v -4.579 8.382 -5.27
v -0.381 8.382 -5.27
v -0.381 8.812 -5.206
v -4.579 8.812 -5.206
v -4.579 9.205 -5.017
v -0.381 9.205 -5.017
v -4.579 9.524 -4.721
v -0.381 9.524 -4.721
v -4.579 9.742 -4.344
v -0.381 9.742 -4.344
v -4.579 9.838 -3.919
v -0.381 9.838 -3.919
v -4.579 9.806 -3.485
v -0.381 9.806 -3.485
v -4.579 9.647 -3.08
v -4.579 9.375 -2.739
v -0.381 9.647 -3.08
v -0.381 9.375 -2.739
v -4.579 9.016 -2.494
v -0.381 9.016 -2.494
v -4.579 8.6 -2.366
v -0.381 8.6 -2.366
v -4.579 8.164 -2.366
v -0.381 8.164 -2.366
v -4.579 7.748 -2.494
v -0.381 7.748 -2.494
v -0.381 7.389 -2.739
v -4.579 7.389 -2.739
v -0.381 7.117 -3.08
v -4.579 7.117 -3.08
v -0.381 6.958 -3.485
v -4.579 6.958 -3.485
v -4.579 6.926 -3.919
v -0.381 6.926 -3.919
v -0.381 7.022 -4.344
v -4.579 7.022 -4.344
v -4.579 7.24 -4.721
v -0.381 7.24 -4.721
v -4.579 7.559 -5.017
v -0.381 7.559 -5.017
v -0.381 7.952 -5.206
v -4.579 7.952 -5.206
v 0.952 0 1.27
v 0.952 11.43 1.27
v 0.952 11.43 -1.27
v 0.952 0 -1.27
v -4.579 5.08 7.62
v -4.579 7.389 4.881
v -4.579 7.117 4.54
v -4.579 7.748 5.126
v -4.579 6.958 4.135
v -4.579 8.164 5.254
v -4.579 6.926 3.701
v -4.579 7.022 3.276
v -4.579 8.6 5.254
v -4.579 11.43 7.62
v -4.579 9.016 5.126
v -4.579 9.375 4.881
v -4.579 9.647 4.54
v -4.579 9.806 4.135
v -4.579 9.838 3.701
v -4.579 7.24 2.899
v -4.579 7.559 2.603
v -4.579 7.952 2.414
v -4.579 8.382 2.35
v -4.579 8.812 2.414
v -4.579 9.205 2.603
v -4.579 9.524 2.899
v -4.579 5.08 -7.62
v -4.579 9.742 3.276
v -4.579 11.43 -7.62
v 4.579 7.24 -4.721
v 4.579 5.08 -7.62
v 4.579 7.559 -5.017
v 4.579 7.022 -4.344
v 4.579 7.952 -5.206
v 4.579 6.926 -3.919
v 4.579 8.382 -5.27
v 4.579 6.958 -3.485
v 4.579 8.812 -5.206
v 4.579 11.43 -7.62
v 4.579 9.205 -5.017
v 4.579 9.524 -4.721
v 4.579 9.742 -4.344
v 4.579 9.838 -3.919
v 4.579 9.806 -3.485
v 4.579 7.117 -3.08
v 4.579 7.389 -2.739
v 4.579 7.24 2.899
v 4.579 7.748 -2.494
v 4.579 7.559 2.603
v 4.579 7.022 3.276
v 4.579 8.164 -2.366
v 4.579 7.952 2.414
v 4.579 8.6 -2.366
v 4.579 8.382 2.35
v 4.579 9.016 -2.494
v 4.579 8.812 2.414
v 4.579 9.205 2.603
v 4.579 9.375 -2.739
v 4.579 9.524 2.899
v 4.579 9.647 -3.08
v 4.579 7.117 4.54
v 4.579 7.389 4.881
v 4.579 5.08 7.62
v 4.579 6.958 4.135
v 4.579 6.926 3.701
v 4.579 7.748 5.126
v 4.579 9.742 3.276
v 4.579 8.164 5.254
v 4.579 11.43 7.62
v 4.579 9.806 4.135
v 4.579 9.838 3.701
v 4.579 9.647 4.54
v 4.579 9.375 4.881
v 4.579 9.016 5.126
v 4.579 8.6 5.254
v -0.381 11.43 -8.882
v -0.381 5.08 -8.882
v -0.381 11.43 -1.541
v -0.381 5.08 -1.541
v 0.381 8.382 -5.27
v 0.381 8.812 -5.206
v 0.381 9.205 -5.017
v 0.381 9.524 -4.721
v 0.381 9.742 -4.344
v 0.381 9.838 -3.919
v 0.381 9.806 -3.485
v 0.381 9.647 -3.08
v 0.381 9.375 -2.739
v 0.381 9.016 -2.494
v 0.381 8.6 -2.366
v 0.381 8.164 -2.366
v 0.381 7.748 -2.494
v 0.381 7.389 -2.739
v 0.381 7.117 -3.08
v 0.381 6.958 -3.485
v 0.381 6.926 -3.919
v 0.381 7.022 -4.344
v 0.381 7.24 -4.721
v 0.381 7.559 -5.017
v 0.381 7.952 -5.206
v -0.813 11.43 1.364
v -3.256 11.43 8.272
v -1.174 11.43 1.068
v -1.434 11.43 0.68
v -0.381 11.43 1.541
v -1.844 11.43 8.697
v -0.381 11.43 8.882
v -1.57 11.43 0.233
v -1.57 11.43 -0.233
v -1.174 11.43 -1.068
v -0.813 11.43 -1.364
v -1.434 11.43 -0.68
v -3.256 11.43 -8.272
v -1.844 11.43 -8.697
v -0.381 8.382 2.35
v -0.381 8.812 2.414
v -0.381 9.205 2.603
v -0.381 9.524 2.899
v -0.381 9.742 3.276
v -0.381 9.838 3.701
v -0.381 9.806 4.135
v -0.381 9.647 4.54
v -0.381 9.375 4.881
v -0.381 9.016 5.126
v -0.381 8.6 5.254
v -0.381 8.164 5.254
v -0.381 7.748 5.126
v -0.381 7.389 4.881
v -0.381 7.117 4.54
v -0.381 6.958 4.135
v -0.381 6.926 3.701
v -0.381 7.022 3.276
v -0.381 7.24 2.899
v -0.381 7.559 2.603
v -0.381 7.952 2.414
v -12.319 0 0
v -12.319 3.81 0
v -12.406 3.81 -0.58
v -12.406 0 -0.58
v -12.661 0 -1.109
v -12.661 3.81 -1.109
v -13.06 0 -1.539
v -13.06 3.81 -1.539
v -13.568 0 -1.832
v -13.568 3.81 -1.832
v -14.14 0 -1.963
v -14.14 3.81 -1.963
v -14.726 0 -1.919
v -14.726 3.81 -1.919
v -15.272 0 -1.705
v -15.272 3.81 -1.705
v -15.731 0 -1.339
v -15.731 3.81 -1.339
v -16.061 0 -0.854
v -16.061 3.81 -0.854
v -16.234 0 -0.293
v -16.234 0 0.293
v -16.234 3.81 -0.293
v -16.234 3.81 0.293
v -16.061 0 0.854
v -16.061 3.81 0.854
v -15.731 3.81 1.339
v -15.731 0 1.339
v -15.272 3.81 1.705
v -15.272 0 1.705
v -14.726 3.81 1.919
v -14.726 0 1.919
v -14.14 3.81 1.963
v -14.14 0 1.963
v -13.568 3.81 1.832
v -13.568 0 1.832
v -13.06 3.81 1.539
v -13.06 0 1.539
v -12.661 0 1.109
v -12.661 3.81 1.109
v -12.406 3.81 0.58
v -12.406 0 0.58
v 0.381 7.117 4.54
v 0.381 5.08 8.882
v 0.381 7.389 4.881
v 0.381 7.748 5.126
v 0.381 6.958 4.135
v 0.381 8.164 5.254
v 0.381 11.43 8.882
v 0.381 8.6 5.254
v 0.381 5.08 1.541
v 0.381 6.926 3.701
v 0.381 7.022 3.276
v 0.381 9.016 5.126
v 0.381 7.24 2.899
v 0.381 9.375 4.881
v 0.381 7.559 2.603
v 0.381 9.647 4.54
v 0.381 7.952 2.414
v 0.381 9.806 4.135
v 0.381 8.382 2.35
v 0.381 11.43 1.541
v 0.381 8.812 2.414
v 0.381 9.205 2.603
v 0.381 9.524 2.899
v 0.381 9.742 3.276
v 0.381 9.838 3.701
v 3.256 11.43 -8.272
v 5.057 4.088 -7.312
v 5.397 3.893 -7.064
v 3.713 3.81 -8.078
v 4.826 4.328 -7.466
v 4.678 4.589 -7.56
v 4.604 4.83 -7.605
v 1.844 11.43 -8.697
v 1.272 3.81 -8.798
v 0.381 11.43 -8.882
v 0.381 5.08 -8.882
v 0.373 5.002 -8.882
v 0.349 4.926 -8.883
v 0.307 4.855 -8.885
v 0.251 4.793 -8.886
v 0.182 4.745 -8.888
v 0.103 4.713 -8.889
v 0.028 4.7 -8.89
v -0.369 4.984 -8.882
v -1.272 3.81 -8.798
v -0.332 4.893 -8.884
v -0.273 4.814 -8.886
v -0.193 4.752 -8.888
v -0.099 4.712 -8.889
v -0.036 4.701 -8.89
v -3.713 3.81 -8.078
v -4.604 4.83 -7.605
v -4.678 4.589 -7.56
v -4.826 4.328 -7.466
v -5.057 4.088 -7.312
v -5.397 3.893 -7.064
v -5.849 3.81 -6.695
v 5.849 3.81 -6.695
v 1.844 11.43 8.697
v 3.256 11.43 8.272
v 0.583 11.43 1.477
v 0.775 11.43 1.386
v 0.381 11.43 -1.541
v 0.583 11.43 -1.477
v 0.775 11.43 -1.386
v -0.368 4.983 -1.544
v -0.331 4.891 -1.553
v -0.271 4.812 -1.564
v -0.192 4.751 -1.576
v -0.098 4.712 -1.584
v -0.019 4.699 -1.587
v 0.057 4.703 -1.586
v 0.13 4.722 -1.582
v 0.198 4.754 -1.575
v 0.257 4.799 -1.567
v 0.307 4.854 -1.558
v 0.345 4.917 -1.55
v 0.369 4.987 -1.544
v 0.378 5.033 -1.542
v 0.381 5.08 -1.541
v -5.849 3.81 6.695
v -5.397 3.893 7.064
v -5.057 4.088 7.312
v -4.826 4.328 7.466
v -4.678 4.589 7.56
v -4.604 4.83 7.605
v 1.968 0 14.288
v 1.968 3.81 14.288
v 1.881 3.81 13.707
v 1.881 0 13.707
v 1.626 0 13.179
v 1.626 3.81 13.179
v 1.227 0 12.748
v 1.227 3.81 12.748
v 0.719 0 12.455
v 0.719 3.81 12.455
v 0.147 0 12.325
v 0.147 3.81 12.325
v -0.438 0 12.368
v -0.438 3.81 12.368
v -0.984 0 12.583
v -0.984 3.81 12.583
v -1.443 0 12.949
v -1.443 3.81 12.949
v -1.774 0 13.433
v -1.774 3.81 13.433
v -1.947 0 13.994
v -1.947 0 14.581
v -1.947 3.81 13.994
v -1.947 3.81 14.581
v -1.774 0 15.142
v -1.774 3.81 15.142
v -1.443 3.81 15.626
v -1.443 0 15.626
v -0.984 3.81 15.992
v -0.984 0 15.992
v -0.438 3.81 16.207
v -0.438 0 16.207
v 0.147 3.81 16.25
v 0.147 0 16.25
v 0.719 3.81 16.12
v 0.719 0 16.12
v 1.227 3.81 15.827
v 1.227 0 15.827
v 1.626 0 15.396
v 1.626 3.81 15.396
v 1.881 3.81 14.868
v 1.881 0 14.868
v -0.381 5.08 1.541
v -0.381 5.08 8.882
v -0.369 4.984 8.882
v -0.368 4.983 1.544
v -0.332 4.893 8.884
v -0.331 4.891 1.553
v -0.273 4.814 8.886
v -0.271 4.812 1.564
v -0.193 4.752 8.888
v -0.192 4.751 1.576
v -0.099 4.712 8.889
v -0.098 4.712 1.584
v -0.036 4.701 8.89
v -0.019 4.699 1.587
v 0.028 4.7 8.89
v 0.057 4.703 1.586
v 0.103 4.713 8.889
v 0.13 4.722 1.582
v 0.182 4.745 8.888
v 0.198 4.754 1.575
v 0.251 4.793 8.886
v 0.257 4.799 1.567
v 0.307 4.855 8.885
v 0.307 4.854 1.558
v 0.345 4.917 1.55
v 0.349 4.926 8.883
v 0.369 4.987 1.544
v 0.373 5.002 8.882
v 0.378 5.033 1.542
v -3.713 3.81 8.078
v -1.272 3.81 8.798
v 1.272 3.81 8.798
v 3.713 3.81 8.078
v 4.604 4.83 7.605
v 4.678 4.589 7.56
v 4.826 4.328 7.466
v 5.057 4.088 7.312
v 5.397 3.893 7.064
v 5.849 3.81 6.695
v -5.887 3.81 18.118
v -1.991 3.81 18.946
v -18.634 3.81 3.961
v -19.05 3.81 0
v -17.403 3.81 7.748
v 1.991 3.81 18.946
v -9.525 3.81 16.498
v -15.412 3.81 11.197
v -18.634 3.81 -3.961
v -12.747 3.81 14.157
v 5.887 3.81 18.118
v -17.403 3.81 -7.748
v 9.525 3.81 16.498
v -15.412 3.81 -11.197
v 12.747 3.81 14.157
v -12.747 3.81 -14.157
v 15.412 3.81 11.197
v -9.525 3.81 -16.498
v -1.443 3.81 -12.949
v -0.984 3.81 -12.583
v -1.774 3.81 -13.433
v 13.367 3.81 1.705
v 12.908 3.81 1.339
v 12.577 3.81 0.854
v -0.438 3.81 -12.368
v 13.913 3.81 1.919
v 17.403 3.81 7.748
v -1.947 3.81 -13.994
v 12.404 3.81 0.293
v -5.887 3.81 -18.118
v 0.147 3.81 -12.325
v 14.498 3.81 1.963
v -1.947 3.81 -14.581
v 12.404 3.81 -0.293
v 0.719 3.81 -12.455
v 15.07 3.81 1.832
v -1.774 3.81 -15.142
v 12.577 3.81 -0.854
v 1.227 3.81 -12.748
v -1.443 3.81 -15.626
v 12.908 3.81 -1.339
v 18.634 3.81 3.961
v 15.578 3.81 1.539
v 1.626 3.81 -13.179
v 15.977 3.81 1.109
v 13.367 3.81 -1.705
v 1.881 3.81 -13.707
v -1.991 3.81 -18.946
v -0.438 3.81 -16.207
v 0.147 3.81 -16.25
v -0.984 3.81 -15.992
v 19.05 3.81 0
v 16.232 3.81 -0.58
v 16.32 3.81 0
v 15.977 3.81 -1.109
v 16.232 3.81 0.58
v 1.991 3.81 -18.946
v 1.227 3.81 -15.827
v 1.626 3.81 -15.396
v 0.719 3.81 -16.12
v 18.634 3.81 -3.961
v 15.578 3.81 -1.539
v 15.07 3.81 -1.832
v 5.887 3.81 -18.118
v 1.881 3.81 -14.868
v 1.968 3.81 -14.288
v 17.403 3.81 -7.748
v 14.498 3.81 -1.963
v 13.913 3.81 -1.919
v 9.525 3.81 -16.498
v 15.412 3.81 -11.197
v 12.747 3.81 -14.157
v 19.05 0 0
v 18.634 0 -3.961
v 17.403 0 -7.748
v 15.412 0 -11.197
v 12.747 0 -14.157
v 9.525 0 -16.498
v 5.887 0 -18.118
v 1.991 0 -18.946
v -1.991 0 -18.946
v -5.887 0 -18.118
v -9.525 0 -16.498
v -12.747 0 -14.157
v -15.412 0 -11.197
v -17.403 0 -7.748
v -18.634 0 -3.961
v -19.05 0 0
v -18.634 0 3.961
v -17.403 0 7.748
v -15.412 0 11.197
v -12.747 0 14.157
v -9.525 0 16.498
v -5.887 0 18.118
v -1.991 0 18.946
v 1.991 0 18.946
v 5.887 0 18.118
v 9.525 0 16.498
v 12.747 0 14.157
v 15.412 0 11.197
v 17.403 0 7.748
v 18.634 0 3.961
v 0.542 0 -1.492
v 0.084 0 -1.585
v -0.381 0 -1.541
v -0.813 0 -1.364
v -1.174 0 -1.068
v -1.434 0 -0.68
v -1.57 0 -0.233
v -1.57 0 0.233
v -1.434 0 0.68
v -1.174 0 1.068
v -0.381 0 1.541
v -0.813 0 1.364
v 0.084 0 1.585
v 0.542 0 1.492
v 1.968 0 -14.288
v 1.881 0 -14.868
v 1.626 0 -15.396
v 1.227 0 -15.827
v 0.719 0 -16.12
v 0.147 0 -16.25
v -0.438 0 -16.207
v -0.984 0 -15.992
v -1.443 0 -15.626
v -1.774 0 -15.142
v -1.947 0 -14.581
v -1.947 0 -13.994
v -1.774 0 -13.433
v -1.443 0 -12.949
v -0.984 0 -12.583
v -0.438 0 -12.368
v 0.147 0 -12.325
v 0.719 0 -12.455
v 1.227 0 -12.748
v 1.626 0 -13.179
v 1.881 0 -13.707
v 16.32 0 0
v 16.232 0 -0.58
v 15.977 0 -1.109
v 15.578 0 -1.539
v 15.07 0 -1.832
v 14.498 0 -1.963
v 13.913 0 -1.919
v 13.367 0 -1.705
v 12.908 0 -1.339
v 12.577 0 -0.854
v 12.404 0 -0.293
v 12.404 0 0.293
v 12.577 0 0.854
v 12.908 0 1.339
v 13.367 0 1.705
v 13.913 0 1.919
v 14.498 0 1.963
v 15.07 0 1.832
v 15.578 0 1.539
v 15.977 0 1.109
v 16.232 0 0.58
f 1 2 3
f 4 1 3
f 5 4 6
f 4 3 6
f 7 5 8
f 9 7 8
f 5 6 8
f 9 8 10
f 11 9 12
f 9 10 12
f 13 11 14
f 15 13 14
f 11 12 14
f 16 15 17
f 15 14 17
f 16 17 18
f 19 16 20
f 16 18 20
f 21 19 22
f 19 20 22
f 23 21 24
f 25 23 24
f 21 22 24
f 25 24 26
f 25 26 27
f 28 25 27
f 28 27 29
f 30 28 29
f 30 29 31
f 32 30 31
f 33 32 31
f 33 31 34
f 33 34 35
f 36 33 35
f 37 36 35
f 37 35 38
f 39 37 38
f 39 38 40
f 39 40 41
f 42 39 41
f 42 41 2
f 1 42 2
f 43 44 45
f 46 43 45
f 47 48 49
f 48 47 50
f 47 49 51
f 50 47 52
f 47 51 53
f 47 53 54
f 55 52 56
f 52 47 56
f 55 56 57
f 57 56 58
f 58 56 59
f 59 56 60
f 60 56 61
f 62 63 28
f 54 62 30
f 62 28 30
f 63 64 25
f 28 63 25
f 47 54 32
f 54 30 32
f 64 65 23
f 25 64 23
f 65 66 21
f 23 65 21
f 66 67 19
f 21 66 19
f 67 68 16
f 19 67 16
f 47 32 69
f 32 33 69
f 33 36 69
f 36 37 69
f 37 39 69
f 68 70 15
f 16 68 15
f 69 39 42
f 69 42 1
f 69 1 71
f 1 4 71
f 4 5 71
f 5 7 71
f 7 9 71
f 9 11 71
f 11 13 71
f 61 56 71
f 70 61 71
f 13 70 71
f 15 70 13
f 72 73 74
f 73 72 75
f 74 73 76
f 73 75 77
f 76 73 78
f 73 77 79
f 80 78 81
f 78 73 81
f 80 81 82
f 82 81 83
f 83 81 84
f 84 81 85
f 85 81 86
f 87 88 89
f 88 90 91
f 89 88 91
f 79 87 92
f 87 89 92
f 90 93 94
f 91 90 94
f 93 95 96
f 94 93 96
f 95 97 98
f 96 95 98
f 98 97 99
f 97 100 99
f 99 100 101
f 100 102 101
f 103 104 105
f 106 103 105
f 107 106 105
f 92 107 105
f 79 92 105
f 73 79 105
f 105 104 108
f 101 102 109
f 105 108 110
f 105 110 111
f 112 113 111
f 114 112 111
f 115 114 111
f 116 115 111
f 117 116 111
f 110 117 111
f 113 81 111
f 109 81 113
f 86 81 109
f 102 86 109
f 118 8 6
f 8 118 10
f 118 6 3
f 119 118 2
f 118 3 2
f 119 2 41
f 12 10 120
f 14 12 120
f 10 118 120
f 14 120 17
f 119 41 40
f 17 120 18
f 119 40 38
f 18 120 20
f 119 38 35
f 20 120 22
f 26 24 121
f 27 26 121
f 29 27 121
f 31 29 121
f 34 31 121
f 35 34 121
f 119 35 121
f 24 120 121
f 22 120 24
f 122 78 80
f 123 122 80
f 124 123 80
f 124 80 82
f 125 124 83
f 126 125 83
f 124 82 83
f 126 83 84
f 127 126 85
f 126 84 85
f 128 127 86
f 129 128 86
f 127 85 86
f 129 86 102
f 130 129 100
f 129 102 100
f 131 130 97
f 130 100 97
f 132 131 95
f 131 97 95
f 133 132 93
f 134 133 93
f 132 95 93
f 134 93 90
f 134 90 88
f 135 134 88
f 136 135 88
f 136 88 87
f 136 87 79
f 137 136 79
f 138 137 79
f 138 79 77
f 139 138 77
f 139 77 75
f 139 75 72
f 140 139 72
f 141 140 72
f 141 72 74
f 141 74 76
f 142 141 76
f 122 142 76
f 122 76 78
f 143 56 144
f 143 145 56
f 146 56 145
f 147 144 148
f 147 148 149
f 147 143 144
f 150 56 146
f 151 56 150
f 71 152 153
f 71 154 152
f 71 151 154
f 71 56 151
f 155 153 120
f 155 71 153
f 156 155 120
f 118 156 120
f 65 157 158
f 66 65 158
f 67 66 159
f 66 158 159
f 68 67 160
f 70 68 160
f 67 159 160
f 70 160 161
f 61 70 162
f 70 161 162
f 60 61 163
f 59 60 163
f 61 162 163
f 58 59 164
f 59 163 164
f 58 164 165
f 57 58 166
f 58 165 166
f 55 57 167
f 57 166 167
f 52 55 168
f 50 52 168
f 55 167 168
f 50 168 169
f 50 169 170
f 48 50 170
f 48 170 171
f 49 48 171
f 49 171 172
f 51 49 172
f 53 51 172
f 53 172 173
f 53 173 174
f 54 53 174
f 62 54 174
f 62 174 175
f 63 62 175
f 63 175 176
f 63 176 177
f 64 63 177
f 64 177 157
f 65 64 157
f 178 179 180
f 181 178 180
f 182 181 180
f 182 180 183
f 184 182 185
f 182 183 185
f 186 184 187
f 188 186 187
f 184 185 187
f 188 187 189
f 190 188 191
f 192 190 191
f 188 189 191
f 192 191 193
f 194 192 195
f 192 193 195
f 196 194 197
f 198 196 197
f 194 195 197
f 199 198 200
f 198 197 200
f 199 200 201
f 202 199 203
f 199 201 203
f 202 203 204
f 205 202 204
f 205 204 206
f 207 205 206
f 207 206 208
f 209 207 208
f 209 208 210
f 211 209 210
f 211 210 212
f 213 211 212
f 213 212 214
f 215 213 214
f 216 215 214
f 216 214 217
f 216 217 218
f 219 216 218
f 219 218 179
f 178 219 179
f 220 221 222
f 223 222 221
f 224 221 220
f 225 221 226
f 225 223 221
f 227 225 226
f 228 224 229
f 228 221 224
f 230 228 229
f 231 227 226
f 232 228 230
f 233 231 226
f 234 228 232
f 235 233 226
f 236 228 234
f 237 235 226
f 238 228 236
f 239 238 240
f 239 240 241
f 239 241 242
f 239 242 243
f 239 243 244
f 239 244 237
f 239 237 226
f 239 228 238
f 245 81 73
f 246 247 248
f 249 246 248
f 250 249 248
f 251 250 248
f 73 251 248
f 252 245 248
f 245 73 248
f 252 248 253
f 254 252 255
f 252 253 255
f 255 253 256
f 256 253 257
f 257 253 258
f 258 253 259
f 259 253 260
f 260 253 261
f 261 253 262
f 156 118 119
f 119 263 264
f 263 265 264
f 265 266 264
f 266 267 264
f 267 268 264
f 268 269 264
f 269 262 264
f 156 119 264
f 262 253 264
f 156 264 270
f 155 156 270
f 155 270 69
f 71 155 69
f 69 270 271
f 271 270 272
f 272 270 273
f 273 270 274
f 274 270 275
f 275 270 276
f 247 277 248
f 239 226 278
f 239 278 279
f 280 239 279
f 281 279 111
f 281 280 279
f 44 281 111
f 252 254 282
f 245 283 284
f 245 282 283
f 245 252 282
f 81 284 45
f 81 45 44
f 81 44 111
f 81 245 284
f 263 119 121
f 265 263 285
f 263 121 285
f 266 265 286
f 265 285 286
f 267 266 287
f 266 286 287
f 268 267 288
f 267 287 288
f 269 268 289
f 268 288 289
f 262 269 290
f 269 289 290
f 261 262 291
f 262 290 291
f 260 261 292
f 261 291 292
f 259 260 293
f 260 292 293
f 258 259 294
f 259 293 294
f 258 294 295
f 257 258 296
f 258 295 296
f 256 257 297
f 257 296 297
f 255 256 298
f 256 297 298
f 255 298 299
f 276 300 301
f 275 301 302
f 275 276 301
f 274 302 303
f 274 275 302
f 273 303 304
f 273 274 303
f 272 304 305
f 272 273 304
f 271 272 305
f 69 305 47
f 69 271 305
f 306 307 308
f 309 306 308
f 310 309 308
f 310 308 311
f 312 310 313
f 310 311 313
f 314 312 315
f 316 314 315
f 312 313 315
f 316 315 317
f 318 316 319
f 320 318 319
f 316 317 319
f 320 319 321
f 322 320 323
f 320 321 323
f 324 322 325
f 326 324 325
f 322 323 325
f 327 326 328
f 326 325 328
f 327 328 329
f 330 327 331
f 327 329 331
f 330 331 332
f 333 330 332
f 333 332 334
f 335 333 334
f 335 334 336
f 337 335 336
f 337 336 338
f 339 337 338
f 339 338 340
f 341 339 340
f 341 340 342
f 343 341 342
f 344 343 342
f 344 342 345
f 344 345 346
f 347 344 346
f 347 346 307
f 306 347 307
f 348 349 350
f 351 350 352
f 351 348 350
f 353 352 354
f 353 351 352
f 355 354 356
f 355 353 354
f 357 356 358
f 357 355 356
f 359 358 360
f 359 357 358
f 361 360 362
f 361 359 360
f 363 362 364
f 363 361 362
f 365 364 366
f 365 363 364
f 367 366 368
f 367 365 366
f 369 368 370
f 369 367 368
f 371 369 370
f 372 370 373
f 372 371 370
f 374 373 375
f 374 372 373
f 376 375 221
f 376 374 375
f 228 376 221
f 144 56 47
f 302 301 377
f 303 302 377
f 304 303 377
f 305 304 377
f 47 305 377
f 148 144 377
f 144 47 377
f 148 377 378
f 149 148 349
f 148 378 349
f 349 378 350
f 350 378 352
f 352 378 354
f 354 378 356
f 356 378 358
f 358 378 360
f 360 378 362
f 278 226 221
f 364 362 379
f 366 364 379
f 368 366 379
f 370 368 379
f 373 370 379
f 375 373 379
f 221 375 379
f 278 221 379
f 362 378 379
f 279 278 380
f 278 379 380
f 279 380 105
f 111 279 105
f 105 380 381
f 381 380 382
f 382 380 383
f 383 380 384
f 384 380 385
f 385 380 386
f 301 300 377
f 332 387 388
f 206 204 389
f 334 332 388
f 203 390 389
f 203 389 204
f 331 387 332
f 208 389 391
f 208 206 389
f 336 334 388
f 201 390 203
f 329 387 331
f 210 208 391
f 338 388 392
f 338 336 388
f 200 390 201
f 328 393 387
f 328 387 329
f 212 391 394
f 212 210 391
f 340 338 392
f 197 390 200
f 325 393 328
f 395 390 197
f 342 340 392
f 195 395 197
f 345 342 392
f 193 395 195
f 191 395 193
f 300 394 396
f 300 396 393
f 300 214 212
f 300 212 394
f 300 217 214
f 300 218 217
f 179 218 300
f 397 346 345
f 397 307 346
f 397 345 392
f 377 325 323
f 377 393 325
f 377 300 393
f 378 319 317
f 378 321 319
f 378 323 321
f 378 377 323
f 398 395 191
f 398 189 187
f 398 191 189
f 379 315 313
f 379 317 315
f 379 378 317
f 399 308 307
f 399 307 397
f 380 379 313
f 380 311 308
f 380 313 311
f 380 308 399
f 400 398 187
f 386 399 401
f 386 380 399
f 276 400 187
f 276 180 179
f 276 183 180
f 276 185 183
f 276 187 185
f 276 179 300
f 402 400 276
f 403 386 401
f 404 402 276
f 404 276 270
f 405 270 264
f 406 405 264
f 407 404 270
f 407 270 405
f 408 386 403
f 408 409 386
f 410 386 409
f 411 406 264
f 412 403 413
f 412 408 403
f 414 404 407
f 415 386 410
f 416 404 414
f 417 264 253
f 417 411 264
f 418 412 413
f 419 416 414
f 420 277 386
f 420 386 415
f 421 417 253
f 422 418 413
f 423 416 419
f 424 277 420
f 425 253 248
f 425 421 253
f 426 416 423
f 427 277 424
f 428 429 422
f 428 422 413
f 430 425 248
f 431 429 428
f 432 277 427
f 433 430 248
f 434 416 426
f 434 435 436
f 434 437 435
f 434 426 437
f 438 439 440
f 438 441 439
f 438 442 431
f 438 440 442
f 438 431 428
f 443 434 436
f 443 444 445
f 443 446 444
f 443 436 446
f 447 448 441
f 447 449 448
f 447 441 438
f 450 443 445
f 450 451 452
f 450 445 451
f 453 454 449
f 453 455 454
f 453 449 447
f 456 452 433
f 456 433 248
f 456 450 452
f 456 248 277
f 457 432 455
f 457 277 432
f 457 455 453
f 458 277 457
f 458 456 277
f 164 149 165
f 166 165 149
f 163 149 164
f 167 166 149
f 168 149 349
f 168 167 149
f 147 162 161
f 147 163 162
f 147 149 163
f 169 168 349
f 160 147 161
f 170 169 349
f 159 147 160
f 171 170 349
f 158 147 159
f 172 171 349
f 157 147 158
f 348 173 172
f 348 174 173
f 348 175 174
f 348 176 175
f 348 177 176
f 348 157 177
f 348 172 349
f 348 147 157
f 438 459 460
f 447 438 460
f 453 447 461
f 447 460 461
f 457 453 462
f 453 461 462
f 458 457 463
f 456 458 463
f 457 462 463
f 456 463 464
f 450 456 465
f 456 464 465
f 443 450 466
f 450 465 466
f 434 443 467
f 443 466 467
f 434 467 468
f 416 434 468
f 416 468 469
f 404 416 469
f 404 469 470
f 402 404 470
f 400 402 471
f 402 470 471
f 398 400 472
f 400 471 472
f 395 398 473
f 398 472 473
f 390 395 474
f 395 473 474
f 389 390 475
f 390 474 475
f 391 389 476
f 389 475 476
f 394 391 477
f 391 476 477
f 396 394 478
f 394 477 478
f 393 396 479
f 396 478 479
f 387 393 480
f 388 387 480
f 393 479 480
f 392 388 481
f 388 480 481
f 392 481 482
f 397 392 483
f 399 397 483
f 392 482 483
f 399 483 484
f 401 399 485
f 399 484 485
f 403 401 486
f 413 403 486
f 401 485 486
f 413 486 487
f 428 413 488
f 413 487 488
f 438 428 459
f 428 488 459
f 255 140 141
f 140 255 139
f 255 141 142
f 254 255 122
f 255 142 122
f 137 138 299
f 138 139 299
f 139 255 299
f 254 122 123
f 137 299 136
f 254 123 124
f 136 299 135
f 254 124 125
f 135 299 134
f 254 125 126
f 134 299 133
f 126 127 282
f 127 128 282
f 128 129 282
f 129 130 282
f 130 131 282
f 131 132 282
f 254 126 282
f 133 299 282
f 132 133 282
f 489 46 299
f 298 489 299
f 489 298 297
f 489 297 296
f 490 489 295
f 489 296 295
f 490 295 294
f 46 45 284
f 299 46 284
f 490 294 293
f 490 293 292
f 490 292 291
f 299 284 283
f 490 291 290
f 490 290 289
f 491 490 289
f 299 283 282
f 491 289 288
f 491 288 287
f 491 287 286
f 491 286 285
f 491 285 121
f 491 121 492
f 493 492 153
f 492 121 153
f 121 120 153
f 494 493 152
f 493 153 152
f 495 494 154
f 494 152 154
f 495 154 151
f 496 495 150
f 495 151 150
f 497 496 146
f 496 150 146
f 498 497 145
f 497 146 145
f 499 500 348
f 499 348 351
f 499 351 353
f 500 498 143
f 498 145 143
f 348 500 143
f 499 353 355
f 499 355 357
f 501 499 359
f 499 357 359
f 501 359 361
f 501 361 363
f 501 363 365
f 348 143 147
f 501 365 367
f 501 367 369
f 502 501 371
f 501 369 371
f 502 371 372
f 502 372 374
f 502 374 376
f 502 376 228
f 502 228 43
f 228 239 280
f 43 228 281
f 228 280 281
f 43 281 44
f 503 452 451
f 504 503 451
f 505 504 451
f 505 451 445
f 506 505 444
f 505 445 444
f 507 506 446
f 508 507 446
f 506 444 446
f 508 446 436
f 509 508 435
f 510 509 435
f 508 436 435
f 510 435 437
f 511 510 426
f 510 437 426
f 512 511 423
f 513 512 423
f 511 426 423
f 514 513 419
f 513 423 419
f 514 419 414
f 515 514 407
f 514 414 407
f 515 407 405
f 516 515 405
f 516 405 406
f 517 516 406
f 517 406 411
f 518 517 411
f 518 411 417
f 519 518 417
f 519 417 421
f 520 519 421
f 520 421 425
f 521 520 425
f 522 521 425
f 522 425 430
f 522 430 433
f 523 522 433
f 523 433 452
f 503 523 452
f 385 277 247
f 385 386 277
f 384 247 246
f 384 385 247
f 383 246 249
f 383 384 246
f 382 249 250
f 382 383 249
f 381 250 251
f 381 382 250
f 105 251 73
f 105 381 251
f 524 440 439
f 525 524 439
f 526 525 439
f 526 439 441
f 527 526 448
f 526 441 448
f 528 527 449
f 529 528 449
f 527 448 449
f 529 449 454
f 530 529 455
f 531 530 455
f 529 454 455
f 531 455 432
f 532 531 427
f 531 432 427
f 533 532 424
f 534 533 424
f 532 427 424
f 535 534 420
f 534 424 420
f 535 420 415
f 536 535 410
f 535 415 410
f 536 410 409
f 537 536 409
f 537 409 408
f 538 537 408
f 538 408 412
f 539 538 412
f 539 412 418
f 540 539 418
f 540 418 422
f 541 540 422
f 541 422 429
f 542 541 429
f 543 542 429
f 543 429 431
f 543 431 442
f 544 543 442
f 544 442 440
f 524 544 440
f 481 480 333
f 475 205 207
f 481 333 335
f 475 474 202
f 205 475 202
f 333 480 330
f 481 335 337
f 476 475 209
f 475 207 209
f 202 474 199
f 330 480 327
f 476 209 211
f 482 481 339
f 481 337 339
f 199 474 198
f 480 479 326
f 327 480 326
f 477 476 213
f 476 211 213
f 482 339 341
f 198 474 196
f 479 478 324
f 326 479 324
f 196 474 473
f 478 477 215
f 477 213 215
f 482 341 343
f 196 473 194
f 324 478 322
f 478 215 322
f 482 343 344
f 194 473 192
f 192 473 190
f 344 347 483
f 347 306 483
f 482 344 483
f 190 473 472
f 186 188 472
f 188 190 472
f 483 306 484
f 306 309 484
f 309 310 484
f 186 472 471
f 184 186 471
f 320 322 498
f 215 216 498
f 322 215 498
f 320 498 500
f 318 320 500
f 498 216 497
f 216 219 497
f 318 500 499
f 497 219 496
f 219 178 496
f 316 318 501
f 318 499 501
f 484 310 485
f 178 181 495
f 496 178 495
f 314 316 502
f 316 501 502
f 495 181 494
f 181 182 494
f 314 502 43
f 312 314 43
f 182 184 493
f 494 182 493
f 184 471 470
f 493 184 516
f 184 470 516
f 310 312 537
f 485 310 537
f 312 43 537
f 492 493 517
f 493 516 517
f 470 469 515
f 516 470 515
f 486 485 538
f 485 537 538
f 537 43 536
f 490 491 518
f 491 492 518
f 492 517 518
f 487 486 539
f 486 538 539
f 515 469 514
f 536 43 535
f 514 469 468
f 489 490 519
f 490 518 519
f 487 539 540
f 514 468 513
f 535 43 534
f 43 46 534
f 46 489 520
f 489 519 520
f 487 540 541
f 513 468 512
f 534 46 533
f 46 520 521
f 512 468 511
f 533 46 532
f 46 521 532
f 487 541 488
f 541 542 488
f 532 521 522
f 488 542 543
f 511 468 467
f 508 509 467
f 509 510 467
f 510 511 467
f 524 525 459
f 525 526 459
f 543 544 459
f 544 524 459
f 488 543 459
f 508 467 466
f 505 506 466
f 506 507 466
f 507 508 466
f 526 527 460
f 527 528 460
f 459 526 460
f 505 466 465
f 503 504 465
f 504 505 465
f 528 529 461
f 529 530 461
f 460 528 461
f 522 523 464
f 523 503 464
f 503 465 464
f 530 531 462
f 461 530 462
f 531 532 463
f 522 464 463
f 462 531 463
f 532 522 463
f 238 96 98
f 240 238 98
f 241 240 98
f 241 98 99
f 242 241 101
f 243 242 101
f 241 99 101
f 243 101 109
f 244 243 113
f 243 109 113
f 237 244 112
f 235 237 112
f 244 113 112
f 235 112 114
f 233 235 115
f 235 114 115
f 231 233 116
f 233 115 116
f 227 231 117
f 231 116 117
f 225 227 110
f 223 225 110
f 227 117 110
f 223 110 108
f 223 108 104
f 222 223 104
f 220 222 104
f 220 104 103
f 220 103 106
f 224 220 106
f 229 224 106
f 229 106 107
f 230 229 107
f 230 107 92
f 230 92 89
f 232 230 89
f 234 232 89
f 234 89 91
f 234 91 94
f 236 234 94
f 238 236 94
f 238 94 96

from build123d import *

# Parameters (mm, degrees)
SKETCH1_R               = 19.05
BOSS_EXTRUDE1_DEPTH     = 3.81
SKETCH2_R               = 8.89
BOSS_EXTRUDE2_DEPTH     = 7.62
CUT_EXTRUDE1_DEPTH      = 12.43
CUT_EXTRUDE2_DEPTH      = 20.05
CUT_EXTRUDE2_DEPTH_BACK = 20.05
CUT_EXTRUDE3_DEPTH      = 7.62
FILLET1_R               = 1.27
SKETCH6_R               = 1.4605
CUT_EXTRUDE4_DEPTH      = 24.62905012
SKETCH7_R               = 1.9685
CUT_EXTRUDE5_DEPTH      = 4.8100001


with BuildPart() as part:
    # Sketch1 → Boss-Extrude1 (new body)
    with BuildSketch(Plane(origin=(0, 0, 0), x_dir=(1, 0, 0), z_dir=(0, 1, 0))):
        Circle(SKETCH1_R)
    extrude(amount=BOSS_EXTRUDE1_DEPTH)

    # Sketch2 → Boss-Extrude2 (add)
    with BuildSketch(Plane(origin=(0, 3.81, 0), x_dir=(1, 0, 0), z_dir=(0, 1, 0))):
        Circle(SKETCH2_R)
    extrude(amount=BOSS_EXTRUDE2_DEPTH)

    # Sketch3 → Cut-Extrude1 (cut, through all)
    with BuildSketch(Plane(origin=(0, 11.43, 0), x_dir=(1, 0, 0), z_dir=(0, 1, 0))):
        with BuildLine():
            Line((0.9525, -1.27), (0.9525, 1.27))
            ThreePointArc((0.9525, 1.27), (-1.5875, 0), (0.9525, -1.27))
        make_face()
    extrude(amount=-CUT_EXTRUDE1_DEPTH, mode=Mode.SUBTRACT)

    # Sketch4 → Cut-Extrude2 (cut, two sides)
    with BuildSketch(Plane.XY) as cut_extrude2_sk:
        with BuildLine():
            Line((-0.381, 11.43), (-0.381, 5.08))
            ThreePointArc((-0.381, 5.08), (0, 4.699), (0.381, 5.08))
            Line((0.381, 5.08), (0.381, 11.43))
            Line((0.381, 11.43), (-0.381, 11.43))
        make_face()
    extrude(amount=CUT_EXTRUDE2_DEPTH, mode=Mode.SUBTRACT)
    extrude(cut_extrude2_sk.sketch, amount=-CUT_EXTRUDE2_DEPTH_BACK, mode=Mode.SUBTRACT)

    # Sketch5 → Cut-Extrude3 (cut)
    with BuildSketch(Plane(origin=(0, 11.43, 0), x_dir=(1, 0, 0), z_dir=(0, 1, 0))):
        with BuildLine():
            Line((4.57905012, 7.62), (4.57905012, -7.62))
            ThreePointArc((4.57905012, -7.62), (8.89, 0), (4.57905012, 7.62))
        make_face()
        with BuildLine():
            Line((-4.57905012, -7.62), (-4.57905012, 7.62))
            ThreePointArc((-4.57905012, 7.62), (-8.89, 0), (-4.57905012, -7.62))
        make_face()
    extrude(amount=-CUT_EXTRUDE3_DEPTH, mode=Mode.SUBTRACT)

    # Fillet1
    fillet1_edges = [part.edges().sort_by_distance(p)[0] for p in [
        (4.57905012, 3.81, 0),
        (-4.57905012, 3.81, 0),
    ]]
    fillet(fillet1_edges, radius=FILLET1_R)

    # Sketch6 → Cut-Extrude4 (cut, through all)
    with BuildSketch(Plane(origin=(4.57905012, 0, 0), x_dir=(0, 0, -1), z_dir=(1, 0, 0))):
        with Locations((-3.81, 8.382)):
            Circle(SKETCH6_R)
        with Locations((3.81, 8.382)):
            Circle(SKETCH6_R)
    extrude(amount=-CUT_EXTRUDE4_DEPTH, mode=Mode.SUBTRACT)

    # Sketch7 → Cut-Extrude5 (cut, through all)
    with BuildSketch(Plane(origin=(0, 3.81, 0), x_dir=(1, 0, 0), z_dir=(0, 1, 0))):
        with Locations((-14.2875, 0)):
            Circle(SKETCH7_R)
        with Locations((0, 14.2875)):
            Circle(SKETCH7_R)
        with Locations((14.351, 0)):
            Circle(SKETCH7_R)
        with Locations((0, -14.2875)):
            Circle(SKETCH7_R)
    extrude(amount=-CUT_EXTRUDE5_DEPTH, mode=Mode.SUBTRACT)


solid = part.part
